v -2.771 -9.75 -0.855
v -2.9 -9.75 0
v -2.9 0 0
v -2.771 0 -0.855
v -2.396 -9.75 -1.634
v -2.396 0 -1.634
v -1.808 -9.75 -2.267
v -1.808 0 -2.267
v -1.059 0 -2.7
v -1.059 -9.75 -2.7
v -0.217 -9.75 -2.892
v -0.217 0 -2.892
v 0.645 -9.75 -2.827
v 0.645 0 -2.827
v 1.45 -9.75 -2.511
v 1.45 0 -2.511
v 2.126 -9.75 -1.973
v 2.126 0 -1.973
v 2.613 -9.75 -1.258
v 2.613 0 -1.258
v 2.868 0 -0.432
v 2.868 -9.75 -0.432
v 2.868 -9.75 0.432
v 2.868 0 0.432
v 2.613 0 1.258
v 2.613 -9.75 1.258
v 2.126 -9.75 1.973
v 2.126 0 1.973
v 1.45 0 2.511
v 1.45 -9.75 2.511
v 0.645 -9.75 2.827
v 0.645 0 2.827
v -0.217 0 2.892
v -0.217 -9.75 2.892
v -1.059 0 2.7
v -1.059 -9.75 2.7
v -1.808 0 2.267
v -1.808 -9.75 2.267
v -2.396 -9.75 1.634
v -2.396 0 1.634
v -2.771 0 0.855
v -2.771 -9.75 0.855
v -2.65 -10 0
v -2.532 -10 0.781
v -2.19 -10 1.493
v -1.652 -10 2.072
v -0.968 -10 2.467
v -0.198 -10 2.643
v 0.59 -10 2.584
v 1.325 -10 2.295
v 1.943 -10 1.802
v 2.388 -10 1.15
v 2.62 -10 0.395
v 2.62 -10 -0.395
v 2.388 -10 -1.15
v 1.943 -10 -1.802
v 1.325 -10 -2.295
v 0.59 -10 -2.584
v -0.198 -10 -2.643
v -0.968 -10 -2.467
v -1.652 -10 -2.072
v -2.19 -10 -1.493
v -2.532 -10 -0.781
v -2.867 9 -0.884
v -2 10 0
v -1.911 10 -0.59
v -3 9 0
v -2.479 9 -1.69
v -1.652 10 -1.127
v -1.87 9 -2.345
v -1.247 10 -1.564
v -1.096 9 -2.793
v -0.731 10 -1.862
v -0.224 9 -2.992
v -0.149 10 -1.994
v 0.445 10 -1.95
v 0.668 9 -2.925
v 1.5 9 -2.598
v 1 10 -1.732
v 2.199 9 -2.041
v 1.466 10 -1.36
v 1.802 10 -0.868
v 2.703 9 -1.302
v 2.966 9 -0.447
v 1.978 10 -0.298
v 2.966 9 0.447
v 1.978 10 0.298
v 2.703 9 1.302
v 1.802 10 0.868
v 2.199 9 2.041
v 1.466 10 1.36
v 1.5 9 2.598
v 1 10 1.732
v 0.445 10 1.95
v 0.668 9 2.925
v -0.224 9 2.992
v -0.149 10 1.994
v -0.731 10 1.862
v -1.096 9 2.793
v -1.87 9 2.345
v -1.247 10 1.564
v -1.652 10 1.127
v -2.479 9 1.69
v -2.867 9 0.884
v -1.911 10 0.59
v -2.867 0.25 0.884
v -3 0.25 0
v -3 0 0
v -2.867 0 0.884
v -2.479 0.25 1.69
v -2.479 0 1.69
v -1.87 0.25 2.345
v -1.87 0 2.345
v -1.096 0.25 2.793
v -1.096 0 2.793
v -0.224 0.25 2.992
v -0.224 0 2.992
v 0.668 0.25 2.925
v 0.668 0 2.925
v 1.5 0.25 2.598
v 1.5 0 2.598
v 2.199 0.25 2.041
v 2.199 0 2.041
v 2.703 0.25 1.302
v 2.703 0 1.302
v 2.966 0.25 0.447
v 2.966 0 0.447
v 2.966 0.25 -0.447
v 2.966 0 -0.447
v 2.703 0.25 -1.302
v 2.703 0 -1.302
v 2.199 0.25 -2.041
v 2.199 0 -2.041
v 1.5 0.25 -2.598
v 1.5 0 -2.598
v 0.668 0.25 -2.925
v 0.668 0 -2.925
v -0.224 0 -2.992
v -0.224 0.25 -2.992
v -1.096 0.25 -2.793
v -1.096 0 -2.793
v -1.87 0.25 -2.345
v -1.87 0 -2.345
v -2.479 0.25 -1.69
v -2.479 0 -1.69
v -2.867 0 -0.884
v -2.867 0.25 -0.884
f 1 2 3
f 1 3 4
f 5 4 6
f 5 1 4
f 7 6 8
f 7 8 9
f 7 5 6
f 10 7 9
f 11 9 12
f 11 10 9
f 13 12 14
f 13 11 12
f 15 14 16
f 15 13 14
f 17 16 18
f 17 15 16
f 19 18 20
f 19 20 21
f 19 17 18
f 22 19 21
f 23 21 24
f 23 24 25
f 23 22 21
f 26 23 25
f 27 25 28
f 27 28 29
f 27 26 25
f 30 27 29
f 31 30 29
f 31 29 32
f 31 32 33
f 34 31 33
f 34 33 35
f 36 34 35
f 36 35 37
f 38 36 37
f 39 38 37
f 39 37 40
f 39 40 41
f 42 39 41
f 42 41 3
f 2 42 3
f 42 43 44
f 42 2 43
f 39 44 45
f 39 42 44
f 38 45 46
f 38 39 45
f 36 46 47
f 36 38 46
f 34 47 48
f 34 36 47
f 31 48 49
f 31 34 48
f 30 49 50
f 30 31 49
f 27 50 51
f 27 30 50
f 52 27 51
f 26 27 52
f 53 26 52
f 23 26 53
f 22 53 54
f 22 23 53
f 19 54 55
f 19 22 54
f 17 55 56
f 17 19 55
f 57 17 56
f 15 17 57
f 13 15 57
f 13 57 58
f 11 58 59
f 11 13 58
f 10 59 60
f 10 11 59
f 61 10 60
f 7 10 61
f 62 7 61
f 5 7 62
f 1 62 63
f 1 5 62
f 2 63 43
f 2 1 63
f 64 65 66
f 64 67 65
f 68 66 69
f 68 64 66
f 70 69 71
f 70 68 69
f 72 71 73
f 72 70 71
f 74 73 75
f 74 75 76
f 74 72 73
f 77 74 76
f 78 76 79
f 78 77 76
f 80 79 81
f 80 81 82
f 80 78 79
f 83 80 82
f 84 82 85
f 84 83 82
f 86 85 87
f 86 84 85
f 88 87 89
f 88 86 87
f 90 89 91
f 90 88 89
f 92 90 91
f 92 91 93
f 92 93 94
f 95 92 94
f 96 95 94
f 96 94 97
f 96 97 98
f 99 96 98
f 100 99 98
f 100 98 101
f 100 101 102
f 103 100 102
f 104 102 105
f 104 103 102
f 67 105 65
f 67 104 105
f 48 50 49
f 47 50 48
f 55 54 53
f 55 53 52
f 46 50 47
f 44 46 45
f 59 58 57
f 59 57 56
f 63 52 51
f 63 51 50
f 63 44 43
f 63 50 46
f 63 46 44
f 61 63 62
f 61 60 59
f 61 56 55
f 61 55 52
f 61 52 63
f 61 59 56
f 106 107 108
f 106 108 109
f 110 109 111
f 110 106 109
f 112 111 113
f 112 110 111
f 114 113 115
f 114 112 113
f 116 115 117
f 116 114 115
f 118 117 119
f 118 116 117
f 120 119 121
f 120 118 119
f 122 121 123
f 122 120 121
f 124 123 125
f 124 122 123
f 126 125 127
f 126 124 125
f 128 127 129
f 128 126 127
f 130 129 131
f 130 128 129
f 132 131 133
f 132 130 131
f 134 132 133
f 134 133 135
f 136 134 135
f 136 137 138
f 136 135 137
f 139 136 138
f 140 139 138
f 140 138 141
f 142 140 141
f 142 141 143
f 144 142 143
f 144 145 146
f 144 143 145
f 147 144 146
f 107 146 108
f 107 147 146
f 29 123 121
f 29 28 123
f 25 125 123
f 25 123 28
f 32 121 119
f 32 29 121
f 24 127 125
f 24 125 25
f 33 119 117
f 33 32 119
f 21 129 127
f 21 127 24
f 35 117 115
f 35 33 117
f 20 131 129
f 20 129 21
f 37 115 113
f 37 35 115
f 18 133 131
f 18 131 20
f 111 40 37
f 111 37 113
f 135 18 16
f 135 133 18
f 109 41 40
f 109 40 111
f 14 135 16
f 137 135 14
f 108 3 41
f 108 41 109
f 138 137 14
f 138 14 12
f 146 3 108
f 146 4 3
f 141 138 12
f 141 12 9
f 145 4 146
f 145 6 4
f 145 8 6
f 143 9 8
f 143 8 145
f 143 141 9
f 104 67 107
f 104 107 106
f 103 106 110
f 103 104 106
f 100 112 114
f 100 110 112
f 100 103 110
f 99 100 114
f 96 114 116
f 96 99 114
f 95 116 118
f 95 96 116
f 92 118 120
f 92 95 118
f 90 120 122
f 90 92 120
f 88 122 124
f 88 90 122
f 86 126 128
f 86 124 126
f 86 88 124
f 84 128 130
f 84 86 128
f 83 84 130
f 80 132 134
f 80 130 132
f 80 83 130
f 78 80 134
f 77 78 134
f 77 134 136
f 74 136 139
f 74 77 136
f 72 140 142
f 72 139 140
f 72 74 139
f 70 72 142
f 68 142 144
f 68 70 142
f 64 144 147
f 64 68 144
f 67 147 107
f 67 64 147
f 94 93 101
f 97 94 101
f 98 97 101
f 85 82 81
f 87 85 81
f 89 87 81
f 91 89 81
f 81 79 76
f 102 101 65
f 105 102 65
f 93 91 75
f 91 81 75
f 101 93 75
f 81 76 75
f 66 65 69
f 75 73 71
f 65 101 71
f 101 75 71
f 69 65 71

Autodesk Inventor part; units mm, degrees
ref_plane "YZ Plane" through (0, 0, 0) normal (1, 0, 0) x (0, 1, 0)
ref_plane "XZ Plane" through (0, 0, 0) normal (0, 1, 0) x (-1, 0, 0)
ref_plane "XY Plane" through (0, 0, 0) normal (0, 0, 1) x (1, 0, 0)
sketch "Esboço1" plane through (0, 0, 0) normal (0, 0, 1) x (1, 0, 0)
  line L0 (-3.6, 0) -> (0.6, 0) construction
  line L1 (0, -14) -> (0, 14) construction
  line L2 (-3, 10) -> (0, 10)
  line L3 (0, 10) -> (0, -10)
  line L4 (0, -10) -> (-3, -10)
  line L5 (-3, -10) -> (-3, 10)
  line L6 (-3, 0) -> (-2.9, 0)
  line L7 (-2.9, 0) -> (-2.9, -10)
  line L8 (-2, 10) -> (-3, 9)
  line L9 (-2.9, -9.75) -> (-2.65, -10)
  line L10 (-3, 0.25) -> (-2.9, 0.15)
  point P0 (0, 0)
  point P1 (-2.75, 0)
  dimension "d0" = 6
  dimension "d1" = 5.8
  dimension "d2" = 10
  dimension "d3" = 20
  dimension "d4" = 1
  dimension "d5" = 1
  dimension "d6" = 0.25
  dimension "d7" = 0.25
  dimension "d8" = 45
  dimension "d12" = 0.25
revolve "Revolução1" add sketch "Esboço1" angle 360 about axis through (0, 10, 0) along (0, -1, 0) contours L2 L3 L4 L9 L7 L6 L5 L8
thread "Rosca1" size "M6x1" class "6g" standard "ISO Metric profile" full length
equation "\"d6\" = d7"
properties part number "GRJ-03-118" material "Aço SAE 1045"
